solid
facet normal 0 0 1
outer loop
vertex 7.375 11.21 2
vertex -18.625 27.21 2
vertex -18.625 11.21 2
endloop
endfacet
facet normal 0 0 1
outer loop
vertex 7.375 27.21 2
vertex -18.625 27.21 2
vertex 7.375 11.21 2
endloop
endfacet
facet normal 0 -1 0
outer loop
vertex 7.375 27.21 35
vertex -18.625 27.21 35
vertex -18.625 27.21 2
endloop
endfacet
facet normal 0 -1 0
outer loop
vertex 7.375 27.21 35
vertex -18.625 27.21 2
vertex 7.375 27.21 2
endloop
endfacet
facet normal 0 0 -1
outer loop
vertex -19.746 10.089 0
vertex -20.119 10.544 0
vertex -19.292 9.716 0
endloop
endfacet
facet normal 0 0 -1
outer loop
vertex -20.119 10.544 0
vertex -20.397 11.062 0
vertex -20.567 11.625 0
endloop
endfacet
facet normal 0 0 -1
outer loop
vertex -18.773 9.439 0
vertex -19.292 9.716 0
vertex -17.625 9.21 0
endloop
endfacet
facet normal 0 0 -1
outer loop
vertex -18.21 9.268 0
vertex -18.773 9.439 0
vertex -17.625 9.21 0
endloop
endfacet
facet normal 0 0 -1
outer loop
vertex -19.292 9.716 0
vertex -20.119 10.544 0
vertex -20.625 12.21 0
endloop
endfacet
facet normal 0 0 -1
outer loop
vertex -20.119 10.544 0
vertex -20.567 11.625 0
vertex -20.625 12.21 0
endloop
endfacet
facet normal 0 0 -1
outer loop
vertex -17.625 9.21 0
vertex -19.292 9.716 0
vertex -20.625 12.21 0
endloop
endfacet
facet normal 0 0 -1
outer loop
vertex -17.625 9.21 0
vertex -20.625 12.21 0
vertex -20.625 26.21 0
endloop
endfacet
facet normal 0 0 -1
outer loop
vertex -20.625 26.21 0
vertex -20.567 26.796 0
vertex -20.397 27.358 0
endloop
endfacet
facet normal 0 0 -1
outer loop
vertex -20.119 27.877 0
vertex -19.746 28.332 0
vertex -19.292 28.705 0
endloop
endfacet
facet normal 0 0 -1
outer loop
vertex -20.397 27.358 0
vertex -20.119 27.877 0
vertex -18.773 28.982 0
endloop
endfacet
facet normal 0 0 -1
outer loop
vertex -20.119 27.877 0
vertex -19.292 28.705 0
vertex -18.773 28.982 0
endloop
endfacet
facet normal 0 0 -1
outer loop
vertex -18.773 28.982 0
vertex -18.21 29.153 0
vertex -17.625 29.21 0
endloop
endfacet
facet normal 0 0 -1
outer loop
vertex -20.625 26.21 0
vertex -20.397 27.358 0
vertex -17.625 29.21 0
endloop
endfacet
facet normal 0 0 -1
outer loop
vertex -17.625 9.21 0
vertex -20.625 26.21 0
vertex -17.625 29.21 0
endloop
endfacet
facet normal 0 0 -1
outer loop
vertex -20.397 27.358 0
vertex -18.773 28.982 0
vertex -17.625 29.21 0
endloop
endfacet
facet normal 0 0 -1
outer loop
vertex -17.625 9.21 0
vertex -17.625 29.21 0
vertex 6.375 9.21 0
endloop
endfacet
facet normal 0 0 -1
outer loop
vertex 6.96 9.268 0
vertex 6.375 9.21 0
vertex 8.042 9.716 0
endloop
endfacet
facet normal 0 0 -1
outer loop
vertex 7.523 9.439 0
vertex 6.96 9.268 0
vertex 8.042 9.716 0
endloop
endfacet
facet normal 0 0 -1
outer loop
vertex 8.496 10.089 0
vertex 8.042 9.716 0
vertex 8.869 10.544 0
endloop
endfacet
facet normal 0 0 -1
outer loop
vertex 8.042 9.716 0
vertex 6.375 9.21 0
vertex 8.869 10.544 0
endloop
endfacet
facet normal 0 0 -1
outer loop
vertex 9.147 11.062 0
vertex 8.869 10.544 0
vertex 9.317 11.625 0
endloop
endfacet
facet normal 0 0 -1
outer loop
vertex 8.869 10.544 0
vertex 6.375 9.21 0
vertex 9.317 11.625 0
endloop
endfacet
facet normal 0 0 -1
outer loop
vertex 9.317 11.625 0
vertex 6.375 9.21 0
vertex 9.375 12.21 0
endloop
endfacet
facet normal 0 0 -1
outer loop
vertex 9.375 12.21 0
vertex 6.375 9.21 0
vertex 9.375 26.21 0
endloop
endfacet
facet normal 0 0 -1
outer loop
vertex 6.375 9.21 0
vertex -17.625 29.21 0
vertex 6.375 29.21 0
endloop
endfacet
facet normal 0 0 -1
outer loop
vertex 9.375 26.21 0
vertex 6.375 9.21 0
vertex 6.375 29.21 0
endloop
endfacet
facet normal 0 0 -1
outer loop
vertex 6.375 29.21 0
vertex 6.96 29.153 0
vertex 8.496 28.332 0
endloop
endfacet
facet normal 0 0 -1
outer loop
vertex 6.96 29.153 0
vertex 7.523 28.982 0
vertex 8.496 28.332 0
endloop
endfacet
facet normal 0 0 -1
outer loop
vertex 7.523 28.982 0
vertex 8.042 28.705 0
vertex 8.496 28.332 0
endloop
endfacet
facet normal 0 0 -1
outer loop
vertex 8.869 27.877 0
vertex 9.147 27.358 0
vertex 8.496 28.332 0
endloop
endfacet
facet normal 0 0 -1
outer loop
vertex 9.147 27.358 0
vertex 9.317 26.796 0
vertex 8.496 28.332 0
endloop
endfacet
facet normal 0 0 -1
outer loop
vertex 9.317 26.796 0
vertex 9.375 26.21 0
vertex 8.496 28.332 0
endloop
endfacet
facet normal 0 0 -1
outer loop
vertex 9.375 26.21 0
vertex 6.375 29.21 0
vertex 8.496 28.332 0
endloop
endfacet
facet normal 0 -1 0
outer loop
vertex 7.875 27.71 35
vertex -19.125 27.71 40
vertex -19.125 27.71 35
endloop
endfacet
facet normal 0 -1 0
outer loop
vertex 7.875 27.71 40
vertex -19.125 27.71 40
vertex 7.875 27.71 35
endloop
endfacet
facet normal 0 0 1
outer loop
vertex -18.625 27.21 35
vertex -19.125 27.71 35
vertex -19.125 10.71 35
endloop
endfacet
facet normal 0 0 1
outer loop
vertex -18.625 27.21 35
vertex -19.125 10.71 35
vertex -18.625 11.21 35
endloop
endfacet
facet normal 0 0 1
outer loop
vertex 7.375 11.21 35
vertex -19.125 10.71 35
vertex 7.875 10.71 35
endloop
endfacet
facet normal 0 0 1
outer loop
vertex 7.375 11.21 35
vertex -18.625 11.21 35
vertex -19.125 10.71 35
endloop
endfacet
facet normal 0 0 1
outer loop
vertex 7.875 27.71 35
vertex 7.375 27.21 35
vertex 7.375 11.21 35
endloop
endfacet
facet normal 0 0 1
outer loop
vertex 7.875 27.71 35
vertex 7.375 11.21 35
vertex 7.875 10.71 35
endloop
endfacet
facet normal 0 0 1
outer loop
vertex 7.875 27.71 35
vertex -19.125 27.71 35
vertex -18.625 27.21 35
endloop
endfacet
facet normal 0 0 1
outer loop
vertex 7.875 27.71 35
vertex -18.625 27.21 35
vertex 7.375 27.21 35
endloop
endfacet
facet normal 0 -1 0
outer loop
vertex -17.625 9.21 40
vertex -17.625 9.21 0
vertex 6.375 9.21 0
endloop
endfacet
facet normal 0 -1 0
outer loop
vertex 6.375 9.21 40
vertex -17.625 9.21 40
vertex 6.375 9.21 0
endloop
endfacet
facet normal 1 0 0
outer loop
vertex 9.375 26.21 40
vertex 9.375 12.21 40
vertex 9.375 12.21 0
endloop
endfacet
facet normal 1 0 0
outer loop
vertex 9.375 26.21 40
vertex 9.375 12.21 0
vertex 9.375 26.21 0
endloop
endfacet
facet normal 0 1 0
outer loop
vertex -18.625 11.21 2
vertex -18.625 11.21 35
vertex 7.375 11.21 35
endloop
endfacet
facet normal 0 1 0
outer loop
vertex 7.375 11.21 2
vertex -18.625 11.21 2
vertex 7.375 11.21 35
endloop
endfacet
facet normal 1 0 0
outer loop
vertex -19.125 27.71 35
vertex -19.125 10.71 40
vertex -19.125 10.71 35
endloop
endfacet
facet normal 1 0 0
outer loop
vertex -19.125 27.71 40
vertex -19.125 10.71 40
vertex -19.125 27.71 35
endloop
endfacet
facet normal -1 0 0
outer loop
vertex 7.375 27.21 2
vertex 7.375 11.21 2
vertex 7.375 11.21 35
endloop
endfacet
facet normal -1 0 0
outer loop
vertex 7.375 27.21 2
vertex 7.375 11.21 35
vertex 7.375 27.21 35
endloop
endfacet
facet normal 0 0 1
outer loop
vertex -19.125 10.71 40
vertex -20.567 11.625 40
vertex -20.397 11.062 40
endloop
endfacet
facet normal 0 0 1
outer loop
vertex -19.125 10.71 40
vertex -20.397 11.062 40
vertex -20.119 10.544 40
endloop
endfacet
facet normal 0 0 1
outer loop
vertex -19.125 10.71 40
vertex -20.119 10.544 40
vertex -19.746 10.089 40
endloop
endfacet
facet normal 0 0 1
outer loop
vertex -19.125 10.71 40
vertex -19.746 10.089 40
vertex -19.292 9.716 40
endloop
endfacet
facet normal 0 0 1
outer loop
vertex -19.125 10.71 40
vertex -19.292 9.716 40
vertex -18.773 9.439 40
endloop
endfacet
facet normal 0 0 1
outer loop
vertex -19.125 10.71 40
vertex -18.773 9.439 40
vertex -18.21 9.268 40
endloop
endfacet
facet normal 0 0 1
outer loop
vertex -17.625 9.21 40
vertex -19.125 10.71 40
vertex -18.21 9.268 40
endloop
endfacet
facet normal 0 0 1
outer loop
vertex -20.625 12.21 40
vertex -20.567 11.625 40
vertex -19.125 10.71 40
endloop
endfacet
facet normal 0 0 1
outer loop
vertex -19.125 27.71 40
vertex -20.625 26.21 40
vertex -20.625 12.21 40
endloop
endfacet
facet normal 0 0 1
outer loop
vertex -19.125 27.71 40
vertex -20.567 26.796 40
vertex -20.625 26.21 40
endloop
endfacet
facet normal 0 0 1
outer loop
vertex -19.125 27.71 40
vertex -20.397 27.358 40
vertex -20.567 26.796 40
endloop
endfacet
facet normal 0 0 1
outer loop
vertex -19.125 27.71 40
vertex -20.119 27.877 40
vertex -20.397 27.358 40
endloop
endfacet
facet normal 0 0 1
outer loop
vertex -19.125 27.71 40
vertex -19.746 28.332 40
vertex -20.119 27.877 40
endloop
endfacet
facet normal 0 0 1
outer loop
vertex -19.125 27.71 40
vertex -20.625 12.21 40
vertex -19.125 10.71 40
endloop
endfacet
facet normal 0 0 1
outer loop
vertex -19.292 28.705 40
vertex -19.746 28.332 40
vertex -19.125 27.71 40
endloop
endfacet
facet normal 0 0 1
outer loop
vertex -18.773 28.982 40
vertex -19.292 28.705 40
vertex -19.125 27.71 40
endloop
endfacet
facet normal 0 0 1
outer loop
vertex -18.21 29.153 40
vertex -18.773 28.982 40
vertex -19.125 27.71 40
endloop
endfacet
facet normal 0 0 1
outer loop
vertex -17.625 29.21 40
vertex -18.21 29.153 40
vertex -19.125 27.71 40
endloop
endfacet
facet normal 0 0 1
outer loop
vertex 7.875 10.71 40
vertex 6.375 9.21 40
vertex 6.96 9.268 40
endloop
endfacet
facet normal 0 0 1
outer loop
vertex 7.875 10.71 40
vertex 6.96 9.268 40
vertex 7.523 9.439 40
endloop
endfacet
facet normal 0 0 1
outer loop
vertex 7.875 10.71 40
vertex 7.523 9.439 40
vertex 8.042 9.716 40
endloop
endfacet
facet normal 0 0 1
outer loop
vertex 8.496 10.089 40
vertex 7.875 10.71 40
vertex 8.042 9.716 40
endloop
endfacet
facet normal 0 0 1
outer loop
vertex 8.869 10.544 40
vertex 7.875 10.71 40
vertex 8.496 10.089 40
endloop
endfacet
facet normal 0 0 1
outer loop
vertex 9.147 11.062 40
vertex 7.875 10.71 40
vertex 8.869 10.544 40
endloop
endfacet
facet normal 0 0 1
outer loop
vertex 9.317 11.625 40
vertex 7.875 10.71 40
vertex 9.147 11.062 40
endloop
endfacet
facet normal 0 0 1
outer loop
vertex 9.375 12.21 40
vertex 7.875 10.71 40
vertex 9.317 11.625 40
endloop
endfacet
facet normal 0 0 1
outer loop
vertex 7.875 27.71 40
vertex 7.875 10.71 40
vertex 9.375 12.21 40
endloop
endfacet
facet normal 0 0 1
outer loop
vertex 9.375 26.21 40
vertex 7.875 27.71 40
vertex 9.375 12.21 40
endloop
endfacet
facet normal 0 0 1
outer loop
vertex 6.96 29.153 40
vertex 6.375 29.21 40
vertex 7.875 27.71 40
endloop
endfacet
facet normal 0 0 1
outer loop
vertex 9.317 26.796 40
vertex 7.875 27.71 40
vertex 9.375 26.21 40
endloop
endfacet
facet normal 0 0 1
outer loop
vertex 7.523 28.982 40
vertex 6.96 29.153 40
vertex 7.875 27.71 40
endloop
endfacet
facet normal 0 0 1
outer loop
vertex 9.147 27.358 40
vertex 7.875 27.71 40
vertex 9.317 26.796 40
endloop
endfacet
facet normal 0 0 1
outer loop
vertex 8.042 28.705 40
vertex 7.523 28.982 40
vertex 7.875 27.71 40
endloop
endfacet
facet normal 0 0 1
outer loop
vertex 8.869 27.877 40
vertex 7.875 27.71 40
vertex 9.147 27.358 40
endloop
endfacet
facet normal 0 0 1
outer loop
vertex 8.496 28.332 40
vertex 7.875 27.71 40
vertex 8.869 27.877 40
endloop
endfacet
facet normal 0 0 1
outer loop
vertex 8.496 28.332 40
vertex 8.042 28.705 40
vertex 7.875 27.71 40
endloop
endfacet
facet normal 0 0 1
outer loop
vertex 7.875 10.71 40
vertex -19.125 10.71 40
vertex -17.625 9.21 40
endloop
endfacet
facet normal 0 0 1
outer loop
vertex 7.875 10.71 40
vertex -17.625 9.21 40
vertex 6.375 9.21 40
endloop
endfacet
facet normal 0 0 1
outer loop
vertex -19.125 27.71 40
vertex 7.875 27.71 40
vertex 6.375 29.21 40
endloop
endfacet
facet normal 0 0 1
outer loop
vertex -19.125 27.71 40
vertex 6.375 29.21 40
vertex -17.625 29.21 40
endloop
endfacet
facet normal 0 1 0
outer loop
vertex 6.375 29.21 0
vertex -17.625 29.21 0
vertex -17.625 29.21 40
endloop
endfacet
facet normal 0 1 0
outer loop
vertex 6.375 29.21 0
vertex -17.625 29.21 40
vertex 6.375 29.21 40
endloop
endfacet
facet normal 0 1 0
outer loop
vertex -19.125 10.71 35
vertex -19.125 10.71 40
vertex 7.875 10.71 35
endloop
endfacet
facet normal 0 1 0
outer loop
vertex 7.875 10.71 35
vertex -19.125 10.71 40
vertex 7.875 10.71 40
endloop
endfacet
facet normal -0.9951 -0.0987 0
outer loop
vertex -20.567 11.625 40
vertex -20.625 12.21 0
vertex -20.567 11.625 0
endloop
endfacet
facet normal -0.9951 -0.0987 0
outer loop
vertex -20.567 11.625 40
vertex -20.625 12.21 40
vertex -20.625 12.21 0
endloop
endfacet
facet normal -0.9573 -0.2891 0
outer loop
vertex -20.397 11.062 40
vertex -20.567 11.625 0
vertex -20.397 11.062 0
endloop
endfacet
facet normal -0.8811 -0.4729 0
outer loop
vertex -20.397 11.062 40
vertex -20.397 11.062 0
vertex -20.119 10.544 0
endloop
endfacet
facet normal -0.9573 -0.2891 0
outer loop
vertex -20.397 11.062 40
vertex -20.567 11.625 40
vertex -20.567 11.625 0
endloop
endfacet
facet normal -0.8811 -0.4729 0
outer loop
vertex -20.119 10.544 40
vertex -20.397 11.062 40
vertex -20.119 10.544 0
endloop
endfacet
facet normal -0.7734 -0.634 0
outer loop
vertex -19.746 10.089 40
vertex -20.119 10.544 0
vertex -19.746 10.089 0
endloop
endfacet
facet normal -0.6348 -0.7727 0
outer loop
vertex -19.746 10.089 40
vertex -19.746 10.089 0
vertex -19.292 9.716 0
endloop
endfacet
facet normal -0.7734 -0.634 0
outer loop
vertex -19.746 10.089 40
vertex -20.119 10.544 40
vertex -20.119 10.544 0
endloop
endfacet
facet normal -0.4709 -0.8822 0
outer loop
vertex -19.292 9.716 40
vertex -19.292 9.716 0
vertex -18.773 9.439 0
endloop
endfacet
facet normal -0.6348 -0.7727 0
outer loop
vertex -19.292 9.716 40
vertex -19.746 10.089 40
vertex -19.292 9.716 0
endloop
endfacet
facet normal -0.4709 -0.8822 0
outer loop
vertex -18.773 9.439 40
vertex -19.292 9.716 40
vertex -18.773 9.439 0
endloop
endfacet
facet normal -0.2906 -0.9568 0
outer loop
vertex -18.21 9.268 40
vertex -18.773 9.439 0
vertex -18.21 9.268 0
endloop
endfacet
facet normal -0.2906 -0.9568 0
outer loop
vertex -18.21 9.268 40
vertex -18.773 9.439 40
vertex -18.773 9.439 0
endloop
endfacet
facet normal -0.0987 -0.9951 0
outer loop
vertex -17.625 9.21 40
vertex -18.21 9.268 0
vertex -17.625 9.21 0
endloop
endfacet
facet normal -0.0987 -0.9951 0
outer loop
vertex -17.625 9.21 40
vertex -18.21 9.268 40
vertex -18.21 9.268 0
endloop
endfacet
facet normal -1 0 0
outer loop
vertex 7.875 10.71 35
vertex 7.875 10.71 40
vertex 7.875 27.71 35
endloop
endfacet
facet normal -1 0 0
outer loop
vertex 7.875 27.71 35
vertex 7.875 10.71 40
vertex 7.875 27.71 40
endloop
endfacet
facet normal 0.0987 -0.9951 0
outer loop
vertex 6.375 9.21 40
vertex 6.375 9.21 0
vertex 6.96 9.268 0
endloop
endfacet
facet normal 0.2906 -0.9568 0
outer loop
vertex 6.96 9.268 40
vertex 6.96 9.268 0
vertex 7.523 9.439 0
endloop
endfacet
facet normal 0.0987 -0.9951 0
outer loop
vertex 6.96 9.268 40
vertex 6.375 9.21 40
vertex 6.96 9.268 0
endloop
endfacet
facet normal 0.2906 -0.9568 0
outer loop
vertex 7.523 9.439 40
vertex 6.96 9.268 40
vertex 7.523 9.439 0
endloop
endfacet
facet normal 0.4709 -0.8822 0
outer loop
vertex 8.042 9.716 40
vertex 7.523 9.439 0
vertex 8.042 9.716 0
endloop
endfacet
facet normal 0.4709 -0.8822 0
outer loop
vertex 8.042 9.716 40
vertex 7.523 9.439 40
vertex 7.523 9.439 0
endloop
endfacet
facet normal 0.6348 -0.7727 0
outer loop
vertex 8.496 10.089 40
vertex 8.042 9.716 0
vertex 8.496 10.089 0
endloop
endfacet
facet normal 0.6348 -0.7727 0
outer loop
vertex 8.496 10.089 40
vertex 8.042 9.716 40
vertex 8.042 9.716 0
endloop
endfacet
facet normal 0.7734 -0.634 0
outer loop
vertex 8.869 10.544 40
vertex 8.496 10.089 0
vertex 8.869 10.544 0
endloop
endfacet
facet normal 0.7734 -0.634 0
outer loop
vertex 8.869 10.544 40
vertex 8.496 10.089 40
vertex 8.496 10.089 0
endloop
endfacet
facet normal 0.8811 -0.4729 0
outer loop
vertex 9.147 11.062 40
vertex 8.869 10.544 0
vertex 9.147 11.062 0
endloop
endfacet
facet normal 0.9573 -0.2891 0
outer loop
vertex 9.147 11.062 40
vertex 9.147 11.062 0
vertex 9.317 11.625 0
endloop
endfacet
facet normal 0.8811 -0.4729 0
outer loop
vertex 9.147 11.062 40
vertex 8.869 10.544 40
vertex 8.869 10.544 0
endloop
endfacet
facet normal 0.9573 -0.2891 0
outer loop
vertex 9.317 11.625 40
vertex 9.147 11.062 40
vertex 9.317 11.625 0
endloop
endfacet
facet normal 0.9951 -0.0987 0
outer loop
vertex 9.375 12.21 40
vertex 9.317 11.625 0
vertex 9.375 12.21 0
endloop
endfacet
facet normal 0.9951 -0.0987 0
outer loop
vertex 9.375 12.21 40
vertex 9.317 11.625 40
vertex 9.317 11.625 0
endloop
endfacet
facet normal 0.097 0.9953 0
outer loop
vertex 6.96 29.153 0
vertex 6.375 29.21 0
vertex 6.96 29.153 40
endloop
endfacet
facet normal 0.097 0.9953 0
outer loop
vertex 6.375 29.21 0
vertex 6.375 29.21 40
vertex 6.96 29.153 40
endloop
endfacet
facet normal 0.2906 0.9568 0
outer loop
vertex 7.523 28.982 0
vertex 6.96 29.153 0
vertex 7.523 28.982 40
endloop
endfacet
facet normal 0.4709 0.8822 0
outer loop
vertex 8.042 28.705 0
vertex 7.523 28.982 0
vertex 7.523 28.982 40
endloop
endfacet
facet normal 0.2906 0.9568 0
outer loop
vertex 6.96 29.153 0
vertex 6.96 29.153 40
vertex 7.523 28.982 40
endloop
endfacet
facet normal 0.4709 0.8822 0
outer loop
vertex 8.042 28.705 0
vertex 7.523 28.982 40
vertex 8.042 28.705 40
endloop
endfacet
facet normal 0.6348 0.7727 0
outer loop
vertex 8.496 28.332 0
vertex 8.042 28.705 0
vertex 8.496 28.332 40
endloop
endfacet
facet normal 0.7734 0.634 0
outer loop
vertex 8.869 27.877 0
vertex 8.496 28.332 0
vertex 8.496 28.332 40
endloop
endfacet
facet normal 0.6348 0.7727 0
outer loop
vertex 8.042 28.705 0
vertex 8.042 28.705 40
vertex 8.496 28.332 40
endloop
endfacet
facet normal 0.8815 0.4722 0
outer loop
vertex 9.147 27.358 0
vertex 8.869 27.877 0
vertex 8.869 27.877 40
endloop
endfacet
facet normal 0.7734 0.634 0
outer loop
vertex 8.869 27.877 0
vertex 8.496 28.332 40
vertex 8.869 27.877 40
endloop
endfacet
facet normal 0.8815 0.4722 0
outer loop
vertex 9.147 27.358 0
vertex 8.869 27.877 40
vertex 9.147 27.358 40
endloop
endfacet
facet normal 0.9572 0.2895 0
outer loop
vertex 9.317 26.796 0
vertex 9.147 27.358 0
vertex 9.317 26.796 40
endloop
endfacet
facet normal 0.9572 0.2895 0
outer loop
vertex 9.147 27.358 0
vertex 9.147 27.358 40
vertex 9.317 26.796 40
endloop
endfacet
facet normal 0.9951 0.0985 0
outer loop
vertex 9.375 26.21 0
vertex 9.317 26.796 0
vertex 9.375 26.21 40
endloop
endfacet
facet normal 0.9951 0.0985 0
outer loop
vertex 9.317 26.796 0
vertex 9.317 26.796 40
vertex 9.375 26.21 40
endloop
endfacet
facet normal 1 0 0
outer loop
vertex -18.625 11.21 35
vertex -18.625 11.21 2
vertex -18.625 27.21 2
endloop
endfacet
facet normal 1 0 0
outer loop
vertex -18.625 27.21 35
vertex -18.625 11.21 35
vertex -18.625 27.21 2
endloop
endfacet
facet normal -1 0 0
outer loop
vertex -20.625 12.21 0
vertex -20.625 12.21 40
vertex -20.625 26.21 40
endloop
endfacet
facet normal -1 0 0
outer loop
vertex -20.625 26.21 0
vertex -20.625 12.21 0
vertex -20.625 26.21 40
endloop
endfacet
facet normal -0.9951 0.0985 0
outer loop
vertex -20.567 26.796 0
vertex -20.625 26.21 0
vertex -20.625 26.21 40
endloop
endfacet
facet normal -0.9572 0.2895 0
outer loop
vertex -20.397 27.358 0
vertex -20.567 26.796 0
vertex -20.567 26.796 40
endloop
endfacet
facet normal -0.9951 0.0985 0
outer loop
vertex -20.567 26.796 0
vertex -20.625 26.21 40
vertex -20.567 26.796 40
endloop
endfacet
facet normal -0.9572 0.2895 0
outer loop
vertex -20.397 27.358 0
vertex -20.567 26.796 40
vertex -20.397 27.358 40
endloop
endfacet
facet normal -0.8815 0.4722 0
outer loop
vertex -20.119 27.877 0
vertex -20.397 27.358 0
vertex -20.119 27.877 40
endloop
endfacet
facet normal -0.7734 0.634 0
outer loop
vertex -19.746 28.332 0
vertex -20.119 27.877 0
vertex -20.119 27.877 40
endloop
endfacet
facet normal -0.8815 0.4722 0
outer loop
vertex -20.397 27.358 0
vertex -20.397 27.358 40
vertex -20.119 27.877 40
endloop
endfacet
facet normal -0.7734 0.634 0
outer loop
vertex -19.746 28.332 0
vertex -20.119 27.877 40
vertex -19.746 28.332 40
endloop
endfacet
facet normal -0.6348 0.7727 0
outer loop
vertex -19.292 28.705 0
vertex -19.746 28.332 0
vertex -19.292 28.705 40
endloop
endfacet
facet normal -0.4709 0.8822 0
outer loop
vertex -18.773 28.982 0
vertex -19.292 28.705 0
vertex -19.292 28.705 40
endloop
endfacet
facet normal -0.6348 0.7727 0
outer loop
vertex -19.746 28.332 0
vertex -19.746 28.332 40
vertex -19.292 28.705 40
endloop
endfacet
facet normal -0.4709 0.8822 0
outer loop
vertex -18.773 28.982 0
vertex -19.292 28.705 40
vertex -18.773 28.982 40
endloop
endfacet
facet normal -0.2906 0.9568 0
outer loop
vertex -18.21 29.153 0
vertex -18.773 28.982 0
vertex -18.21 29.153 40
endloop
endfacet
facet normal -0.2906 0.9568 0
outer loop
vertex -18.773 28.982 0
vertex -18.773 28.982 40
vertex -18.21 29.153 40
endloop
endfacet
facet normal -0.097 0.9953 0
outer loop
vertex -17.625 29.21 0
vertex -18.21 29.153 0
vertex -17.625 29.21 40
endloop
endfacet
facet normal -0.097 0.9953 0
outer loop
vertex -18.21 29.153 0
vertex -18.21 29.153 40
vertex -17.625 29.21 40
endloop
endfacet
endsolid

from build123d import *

# Parameters (mm, degrees)
F0_W     = 30
F0_H     = 20
F1_DEPTH = 40
F2_W     = 26
F2_H     = 16
F3_DEPTH = 38
F4_W     = 27
F4_H     = 17
F5_DEPTH = 5
F6_R     = 3


with BuildPart() as f1:
    # F0 (on Top) → F1 (new body)
    with BuildSketch(Plane.XY):
        with Locations((-5.625001, 19.210285)):
            Rectangle(F0_W, F0_H)
    extrude(amount=F1_DEPTH)

    # F2 (on face) → F3 (cut)
    with BuildSketch(Plane.XY.offset(40)):
        with Locations((-5.625001, 19.210285)):
            Rectangle(F2_W, F2_H)
    extrude(amount=-F3_DEPTH, mode=Mode.SUBTRACT)

    # F4 (on face) → F5 (cut)
    with BuildSketch(Plane.XY.offset(40)):
        with Locations((-5.625001, 19.210285)):
            Rectangle(F4_W, F4_H)
    extrude(amount=-F5_DEPTH, mode=Mode.SUBTRACT)

    # F6
    f6_edges = [f1.edges().sort_by_distance(p)[0] for p in [
        (-20.625001, 9.210285, 20),
        (-20.625001, 29.210285, 20),
        (9.374999, 9.210285, 20),
        (9.374999, 29.210285, 20),
    ]]
    fillet(f6_edges, radius=F6_R)


solid = f1.part
